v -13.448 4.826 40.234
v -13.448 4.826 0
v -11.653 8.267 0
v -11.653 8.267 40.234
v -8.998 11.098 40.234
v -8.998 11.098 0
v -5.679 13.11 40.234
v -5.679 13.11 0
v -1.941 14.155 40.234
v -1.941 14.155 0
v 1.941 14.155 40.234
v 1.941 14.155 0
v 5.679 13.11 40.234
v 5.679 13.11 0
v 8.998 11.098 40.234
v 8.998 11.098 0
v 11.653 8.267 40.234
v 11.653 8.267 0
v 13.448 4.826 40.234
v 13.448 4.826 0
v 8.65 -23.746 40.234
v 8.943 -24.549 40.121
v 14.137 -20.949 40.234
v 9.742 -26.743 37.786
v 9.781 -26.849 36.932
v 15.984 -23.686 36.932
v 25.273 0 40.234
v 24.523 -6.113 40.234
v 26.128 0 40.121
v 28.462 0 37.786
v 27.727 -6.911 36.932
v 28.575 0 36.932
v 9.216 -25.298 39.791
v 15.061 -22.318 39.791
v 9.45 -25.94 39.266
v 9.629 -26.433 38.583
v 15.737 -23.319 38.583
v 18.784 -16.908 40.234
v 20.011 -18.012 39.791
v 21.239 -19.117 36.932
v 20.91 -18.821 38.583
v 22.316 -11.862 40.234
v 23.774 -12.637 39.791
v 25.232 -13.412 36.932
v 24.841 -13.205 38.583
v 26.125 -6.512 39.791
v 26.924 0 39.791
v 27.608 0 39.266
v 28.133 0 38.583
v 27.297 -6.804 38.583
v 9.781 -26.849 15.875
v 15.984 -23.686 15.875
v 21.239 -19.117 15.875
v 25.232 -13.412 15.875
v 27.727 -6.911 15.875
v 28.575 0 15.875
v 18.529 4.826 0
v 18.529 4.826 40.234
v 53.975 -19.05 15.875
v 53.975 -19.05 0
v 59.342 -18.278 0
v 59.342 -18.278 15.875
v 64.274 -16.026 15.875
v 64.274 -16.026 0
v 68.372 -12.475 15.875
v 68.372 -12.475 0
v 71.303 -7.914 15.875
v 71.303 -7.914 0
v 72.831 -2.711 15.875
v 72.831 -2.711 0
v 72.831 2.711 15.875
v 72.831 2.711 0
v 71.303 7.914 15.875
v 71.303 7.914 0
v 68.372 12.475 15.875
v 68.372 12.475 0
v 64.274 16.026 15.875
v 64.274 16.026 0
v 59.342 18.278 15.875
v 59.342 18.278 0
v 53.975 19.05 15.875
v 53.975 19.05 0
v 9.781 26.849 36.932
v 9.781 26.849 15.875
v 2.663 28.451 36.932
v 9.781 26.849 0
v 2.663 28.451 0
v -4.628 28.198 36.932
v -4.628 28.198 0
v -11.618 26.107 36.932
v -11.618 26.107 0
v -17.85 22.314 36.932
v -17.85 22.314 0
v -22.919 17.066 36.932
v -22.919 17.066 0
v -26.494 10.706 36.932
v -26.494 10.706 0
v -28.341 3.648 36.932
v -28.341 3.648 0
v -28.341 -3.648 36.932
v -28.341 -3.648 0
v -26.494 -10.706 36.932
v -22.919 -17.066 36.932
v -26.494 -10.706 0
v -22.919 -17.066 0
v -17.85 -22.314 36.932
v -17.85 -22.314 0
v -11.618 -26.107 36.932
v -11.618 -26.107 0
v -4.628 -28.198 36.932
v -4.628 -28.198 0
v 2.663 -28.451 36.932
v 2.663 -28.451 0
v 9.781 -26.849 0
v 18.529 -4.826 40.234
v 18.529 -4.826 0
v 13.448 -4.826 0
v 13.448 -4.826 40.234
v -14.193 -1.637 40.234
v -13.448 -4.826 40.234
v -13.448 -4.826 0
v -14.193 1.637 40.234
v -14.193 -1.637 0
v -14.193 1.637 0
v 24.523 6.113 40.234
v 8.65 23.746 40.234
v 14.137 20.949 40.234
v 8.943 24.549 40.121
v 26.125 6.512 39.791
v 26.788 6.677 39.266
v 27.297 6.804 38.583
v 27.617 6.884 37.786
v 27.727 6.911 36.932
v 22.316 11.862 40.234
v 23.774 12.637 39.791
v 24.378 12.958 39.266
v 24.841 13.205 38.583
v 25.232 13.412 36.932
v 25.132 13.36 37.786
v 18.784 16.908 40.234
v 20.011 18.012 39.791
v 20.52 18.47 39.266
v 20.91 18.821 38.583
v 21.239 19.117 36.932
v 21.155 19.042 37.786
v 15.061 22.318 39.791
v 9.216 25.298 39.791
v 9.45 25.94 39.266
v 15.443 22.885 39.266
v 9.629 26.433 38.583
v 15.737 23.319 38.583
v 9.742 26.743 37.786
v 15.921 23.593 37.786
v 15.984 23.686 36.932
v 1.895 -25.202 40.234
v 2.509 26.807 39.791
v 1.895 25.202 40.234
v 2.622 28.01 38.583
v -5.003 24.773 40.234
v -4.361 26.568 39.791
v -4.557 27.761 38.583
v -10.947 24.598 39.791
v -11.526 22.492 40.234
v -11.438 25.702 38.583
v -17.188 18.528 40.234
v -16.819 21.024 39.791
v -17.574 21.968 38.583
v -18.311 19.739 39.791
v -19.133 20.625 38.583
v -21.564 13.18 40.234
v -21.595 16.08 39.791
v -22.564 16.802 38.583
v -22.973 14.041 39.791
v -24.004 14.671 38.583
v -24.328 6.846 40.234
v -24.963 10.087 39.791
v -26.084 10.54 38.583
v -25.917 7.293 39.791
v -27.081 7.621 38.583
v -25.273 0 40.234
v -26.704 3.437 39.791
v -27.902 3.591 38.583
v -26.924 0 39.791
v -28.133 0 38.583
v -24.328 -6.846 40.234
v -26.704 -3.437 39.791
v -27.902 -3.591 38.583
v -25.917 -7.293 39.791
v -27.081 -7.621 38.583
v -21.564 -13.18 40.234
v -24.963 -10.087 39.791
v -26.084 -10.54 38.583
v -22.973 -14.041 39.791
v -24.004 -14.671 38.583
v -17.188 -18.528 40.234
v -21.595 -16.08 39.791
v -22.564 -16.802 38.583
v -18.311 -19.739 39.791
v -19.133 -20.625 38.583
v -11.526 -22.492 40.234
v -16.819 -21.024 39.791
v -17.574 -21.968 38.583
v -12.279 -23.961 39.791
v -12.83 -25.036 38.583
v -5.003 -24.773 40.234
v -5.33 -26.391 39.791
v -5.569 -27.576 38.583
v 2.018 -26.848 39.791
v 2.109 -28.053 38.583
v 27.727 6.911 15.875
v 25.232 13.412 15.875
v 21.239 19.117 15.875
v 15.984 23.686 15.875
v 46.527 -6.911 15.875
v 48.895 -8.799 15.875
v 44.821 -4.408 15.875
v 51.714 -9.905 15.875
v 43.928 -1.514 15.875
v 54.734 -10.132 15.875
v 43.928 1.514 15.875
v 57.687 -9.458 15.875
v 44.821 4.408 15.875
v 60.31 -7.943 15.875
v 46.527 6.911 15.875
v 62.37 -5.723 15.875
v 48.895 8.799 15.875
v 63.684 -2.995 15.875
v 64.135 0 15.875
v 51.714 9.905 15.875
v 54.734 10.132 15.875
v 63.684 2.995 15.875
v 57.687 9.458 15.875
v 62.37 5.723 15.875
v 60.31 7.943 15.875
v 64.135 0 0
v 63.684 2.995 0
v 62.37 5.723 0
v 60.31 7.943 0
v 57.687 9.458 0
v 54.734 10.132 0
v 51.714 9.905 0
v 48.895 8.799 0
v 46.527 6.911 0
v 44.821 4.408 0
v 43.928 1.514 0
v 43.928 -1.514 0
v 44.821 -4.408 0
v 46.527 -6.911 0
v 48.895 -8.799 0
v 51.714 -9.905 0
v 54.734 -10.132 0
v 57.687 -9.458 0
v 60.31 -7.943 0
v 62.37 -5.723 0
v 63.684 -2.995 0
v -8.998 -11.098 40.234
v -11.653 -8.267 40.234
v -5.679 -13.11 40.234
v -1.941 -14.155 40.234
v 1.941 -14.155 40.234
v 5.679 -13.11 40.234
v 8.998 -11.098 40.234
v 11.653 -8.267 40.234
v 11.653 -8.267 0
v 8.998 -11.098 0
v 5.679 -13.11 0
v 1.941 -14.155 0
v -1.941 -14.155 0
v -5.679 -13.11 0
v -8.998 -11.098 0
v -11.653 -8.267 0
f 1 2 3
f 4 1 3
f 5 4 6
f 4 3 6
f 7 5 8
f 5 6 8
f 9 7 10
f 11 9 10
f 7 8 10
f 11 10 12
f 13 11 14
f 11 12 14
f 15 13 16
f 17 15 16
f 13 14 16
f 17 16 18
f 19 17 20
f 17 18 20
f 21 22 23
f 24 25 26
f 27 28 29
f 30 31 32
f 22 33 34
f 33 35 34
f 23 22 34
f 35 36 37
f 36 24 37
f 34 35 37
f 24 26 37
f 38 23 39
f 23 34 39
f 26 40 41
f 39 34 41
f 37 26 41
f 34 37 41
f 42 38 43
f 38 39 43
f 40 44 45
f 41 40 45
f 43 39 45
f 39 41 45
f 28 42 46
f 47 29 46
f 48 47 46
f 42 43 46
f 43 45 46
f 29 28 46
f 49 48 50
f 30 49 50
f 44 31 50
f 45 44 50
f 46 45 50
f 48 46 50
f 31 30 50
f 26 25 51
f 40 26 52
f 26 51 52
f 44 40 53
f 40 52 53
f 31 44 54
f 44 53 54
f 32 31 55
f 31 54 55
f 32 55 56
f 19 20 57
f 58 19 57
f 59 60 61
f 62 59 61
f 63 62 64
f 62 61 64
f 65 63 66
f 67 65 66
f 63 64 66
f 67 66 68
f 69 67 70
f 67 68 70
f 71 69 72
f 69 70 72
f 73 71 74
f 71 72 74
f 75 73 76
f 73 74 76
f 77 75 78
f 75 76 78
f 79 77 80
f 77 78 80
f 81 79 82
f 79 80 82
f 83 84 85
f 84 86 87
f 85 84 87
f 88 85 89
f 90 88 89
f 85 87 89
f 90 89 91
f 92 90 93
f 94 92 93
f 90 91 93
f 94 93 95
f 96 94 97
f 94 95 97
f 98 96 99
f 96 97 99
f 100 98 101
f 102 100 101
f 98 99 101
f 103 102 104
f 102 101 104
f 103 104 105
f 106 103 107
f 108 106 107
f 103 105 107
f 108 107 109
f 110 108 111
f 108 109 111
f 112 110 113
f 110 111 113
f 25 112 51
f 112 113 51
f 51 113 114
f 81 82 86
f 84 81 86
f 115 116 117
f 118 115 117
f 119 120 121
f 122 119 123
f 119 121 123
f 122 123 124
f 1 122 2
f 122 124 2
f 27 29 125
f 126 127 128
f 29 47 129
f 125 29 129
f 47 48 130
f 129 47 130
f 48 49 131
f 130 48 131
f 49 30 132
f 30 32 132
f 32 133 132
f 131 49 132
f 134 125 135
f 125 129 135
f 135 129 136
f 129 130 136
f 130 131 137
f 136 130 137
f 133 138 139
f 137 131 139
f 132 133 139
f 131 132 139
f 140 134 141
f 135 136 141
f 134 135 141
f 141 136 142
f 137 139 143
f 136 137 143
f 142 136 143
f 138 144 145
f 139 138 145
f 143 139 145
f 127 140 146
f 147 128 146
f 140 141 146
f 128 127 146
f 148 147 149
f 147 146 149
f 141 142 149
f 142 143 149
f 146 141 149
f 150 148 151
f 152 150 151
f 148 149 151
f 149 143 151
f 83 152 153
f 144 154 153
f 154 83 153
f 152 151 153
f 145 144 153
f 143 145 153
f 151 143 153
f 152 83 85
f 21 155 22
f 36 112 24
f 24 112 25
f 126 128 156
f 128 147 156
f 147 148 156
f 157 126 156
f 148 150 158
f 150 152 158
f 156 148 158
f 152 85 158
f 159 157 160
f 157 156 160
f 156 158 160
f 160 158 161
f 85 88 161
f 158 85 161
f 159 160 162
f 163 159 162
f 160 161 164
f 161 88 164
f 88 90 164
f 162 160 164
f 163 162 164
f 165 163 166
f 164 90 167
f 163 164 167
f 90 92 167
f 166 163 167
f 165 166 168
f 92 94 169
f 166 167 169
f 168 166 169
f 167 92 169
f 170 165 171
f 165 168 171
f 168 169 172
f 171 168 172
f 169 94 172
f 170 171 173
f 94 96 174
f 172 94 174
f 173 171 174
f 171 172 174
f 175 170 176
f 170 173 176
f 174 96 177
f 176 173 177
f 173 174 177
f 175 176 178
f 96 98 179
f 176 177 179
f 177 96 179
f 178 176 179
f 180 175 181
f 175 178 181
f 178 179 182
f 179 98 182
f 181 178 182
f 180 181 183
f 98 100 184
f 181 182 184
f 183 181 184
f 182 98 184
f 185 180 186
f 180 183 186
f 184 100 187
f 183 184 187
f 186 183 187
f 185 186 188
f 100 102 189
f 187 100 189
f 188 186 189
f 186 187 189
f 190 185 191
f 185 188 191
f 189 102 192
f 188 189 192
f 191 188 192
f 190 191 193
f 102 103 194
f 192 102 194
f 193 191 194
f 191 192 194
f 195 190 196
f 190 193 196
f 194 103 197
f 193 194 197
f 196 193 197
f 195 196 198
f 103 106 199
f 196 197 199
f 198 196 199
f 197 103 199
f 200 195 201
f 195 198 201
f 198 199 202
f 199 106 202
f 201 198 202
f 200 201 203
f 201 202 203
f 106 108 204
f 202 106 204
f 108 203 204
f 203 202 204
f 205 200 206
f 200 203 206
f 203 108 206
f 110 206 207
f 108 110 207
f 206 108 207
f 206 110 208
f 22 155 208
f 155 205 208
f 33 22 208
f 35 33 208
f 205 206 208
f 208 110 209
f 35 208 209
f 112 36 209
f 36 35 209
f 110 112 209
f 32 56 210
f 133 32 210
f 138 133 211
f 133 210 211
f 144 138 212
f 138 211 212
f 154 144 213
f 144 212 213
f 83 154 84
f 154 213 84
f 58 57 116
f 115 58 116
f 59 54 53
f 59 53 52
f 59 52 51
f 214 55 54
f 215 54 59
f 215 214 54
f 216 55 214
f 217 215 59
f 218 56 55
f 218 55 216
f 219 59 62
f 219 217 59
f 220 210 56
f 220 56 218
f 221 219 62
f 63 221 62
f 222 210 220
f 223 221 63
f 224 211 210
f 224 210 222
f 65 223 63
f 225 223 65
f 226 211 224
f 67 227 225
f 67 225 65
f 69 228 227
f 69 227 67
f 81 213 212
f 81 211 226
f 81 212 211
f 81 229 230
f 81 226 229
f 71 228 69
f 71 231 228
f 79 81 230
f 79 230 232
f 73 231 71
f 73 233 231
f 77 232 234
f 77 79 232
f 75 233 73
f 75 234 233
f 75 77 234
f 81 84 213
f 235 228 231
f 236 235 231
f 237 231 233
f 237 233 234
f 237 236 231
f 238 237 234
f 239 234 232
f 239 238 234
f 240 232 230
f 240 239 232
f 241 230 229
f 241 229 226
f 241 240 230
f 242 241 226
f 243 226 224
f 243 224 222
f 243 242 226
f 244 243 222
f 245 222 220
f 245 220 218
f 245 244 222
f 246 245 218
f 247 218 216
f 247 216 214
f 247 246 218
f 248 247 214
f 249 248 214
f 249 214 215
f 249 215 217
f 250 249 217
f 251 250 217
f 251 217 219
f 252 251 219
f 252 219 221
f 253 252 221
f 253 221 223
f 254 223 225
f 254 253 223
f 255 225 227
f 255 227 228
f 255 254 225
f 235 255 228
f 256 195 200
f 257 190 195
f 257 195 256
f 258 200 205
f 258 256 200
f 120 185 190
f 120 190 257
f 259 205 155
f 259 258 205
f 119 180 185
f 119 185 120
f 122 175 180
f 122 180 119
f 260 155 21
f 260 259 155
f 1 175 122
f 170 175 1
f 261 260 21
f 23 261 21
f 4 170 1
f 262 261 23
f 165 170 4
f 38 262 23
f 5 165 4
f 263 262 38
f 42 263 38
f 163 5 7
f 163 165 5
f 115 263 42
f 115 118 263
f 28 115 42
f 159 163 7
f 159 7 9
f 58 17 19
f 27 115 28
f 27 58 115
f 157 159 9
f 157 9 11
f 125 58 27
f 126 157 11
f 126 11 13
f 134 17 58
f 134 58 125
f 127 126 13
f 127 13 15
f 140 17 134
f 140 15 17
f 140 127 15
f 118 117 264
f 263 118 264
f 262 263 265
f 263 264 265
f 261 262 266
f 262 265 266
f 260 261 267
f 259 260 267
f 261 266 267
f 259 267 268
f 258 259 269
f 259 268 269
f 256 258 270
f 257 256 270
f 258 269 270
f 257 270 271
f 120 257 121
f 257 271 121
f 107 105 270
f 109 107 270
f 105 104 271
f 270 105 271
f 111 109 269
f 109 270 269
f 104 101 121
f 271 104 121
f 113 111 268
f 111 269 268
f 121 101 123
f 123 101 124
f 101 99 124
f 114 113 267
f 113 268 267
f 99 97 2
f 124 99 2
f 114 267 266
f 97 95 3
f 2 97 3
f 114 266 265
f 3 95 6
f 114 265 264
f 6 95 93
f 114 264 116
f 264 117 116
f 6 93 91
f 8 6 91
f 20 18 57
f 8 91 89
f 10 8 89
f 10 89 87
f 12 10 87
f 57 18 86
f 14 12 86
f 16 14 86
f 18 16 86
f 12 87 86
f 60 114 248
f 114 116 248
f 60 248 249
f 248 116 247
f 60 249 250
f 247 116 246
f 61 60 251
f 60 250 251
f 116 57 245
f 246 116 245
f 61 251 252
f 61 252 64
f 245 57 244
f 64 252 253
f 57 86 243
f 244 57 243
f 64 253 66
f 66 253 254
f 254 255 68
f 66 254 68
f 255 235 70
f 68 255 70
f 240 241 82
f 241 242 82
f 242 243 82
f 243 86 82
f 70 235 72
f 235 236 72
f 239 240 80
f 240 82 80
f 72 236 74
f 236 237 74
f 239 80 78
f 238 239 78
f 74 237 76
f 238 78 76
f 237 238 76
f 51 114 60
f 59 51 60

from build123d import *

# Parameters (mm, degrees)
F1_DEPTH = 40.2336
F0_R     = 10.16
F2_DEPTH = 15.875
F3_R     = 3.302


with BuildPart() as f1:
    # F0 (on Top) → F1 (new body)
    with BuildSketch(Plane.XY):
        with BuildLine():
            ThreePointArc((9.780705, -26.848993), (23.409552, -16.386686), (28.575, 0))
            ThreePointArc((28.575, 0), (23.409552, 16.386686), (9.780705, 26.848993))
            ThreePointArc((9.780705, 26.848993), (-28.575, 0), (9.780705, -26.848993))
        make_face()
        with BuildLine():
            ThreePointArc((-13.447765, -4.826), (-14.2875, 0), (-13.447765, 4.826))
            ThreePointArc((-13.447765, 4.826), (0, 14.2875), (13.447765, 4.826))
            Line((13.447765, 4.826), (18.5293, 4.826))
            Line((18.5293, 4.826), (18.5293, -4.826))
            Line((18.5293, -4.826), (13.447765, -4.826))
            ThreePointArc((13.447765, -4.826), (0, -14.2875), (-13.447765, -4.826))
        make_face(mode=Mode.SUBTRACT)
    extrude(amount=F1_DEPTH)

    # F0 (on Top) → F2 (join)
    with BuildSketch(Plane.XY):
        with BuildLine():
            ThreePointArc((9.780705, -26.848993), (23.409552, -16.386686), (28.575, 0))
            ThreePointArc((28.575, 0), (23.409552, 16.386686), (9.780705, 26.848993))
            ThreePointArc((9.780705, 26.848993), (-28.575, 0), (9.780705, -26.848993))
        make_face()
        with BuildLine():
            ThreePointArc((-13.447765, -4.826), (-14.2875, 0), (-13.447765, 4.826))
            ThreePointArc((-13.447765, 4.826), (0, 14.2875), (13.447765, 4.826))
            Line((13.447765, 4.826), (18.5293, 4.826))
            Line((18.5293, 4.826), (18.5293, -4.826))
            Line((18.5293, -4.826), (13.447765, -4.826))
            ThreePointArc((13.447765, -4.826), (0, -14.2875), (-13.447765, -4.826))
        make_face(mode=Mode.SUBTRACT)
        with BuildLine():
            ThreePointArc((9.780705, 26.848993), (23.409552, 16.386686), (28.575, 0))
            ThreePointArc((28.575, 0), (23.409552, -16.386686), (9.780705, -26.848993))
            Line((9.780705, -26.848993), (53.975, -19.05))
            ThreePointArc((53.975, -19.05), (73.025, 0), (53.975, 19.05))
            Line((53.975, 19.05), (9.780705, 26.848993))
        make_face()
        with Locations((53.975, 0)):
            Circle(F0_R, mode=Mode.SUBTRACT)
    extrude(amount=F2_DEPTH)

    # F3
    f3_edges = [f1.edges().sort_by_distance(p)[0] for p in [
        (-9.780705, 26.848993, 40.2336),
    ]]
    fillet(f3_edges, radius=F3_R)


solid = f1.part
